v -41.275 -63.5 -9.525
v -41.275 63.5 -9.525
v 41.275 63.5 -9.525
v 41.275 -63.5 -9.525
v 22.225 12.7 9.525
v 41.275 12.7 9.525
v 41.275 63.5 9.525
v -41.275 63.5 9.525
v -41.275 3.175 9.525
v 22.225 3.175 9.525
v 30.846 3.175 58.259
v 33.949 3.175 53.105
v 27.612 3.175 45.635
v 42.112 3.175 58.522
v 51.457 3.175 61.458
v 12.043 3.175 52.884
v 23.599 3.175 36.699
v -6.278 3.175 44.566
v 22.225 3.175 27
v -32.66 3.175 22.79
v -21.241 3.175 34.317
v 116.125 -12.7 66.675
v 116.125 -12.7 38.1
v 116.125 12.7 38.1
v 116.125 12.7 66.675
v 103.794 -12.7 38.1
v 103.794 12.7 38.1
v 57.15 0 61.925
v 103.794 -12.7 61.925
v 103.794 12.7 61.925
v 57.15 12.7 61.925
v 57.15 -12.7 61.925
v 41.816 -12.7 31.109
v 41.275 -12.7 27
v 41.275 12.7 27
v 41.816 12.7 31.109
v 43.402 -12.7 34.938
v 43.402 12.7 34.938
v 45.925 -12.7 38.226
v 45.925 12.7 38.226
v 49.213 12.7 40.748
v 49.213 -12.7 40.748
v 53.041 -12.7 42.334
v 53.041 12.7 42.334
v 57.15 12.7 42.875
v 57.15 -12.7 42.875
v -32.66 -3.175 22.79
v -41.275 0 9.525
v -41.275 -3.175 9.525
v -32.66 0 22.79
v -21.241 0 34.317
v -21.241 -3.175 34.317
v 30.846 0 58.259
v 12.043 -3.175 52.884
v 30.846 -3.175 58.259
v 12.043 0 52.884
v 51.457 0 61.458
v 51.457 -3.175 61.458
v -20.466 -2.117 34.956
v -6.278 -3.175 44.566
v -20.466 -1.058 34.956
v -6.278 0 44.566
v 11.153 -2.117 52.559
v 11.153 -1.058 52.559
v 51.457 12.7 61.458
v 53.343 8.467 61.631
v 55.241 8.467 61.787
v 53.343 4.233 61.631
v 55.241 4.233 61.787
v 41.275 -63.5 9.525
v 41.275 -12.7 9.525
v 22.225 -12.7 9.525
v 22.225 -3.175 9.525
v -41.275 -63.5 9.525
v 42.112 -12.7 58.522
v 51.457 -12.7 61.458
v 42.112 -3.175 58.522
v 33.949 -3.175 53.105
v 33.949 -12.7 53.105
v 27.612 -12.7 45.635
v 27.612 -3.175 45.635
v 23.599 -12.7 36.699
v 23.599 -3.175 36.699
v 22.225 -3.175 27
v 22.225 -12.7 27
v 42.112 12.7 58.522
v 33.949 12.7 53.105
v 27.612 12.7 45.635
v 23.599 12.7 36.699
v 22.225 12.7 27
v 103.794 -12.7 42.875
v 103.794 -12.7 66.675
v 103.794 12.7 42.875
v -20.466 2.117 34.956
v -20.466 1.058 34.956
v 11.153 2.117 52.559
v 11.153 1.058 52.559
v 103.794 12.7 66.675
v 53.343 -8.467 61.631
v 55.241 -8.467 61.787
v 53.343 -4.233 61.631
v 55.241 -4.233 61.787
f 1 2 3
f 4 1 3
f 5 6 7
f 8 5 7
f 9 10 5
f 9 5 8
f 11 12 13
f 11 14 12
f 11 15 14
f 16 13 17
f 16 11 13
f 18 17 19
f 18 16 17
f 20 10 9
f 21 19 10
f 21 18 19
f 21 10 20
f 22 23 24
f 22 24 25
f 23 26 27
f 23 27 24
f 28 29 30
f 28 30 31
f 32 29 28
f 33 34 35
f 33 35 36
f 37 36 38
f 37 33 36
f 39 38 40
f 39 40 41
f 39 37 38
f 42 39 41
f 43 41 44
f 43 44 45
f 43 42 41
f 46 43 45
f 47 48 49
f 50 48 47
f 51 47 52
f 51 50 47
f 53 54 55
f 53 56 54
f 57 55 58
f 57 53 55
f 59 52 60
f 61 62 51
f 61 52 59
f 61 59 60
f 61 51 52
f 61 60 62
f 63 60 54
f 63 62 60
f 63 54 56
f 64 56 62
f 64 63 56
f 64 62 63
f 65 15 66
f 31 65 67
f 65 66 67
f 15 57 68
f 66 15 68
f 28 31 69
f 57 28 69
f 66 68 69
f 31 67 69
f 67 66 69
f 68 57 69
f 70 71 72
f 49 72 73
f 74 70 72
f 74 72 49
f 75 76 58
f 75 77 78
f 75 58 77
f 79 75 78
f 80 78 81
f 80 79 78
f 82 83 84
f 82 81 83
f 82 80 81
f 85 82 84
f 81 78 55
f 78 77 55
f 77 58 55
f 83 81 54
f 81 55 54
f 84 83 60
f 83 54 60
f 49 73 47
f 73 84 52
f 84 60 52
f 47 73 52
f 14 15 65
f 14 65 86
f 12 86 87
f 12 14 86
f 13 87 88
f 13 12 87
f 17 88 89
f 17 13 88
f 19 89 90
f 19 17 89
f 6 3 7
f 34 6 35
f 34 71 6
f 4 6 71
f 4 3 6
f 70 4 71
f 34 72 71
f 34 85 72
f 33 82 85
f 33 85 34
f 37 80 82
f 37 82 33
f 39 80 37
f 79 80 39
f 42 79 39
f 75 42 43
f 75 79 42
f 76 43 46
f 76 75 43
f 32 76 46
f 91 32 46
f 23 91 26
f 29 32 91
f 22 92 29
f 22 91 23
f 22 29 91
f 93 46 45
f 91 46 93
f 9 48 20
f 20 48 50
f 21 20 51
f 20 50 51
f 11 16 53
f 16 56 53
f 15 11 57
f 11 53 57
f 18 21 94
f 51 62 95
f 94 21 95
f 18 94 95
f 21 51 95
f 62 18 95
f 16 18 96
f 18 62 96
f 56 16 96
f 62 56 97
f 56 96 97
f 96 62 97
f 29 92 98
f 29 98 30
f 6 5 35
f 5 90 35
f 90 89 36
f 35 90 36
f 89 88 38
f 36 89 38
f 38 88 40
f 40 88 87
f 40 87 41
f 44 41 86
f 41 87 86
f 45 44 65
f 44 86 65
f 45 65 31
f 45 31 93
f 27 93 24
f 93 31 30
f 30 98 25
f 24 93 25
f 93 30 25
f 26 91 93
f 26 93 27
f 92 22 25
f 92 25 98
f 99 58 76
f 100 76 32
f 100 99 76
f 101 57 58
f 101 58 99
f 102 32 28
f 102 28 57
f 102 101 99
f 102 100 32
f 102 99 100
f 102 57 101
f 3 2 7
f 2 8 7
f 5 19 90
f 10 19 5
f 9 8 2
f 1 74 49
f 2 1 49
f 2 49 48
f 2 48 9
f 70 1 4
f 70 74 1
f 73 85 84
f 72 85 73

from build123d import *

# Parameters (mm, degrees)
F1_DEPTH = 63.5
F0_W     = 38.4694138315
F0_H     = 19.05
F2_DEPTH = 12.7
F3_DEPTH = 3.175


with BuildPart() as f1:
    # F0 (on Front) → F1 (new body, symmetric)
    with BuildSketch(Plane.XZ):
        Polygon((-41.275, -9.525), (41.275, -9.525), (41.275, 9.525), (22.225, 9.525), (-41.275, 9.525), align=None)
    extrude(amount=F1_DEPTH, both=True)

    # F0 (on Front) → F2 (join, symmetric)
    with BuildSketch(Plane.XZ):
        with BuildLine():
            Line((22.225, 9.525), (41.275, 9.525))
            Line((41.275, 9.525), (41.275, 27.0002))
            ThreePointArc((41.275, 27.0002), (45.9246798487, 38.2255201513), (57.15, 42.8752))
            Line((57.15, 42.8752), (65.3250142932, 42.8752))
            Line((65.3250142932, 42.8752), (65.3250142932, 61.9252))
            Line((65.3250142932, 61.9252), (57.15, 61.9252))
            add(Edge.make_bspline(
                [(51.4572367621, 61.4581174025), (53.3370613896, 61.6402112434), (55.2348987126, 61.7960082111), (57.15, 61.9252)],
                knots=[106.9298065105, 106.9298065105, 106.9298065105, 106.9298065105, 111.5045361635, 111.5045361635, 111.5045361635, 111.5045361635], degree=3))
            ThreePointArc((51.4572367621, 61.4581174025), (30.517544414, 49.593737449), (22.225, 27.0002))
            Line((22.225, 27.0002), (22.225, 9.525))
        make_face()
        Polygon((103.7944281247, 61.9252), (103.7944281247, 42.8752), (103.7944281247, 38.1), (116.1250142932, 38.1), (116.1250142932, 66.675), (103.7944281247, 66.675), align=None)
        with Locations((84.559721209, 52.4002)):
            Rectangle(F0_W, F0_H)
    extrude(amount=F2_DEPTH, both=True)

    # F0 (on Front) → F3 (join, symmetric)
    with BuildSketch(Plane.XZ):
        with BuildLine():
            add(Edge.make_bspline(
                [(-41.275, 9.525), (-26.5797272303, 38.5784325229), (7.5181848531, 57.2018529553), (51.4572367621, 61.4581174025)],
                knots=[0, 0, 0, 0, 106.9298065105, 106.9298065105, 106.9298065105, 106.9298065105], degree=3))
            Line((-41.275, 9.525), (22.225, 9.525))
            Line((22.225, 9.525), (22.225, 27.0002))
            ThreePointArc((22.225, 27.0002), (30.517544414, 49.593737449), (51.4572367621, 61.4581174025))
        make_face()
    extrude(amount=F3_DEPTH, both=True)


solid = f1.part
